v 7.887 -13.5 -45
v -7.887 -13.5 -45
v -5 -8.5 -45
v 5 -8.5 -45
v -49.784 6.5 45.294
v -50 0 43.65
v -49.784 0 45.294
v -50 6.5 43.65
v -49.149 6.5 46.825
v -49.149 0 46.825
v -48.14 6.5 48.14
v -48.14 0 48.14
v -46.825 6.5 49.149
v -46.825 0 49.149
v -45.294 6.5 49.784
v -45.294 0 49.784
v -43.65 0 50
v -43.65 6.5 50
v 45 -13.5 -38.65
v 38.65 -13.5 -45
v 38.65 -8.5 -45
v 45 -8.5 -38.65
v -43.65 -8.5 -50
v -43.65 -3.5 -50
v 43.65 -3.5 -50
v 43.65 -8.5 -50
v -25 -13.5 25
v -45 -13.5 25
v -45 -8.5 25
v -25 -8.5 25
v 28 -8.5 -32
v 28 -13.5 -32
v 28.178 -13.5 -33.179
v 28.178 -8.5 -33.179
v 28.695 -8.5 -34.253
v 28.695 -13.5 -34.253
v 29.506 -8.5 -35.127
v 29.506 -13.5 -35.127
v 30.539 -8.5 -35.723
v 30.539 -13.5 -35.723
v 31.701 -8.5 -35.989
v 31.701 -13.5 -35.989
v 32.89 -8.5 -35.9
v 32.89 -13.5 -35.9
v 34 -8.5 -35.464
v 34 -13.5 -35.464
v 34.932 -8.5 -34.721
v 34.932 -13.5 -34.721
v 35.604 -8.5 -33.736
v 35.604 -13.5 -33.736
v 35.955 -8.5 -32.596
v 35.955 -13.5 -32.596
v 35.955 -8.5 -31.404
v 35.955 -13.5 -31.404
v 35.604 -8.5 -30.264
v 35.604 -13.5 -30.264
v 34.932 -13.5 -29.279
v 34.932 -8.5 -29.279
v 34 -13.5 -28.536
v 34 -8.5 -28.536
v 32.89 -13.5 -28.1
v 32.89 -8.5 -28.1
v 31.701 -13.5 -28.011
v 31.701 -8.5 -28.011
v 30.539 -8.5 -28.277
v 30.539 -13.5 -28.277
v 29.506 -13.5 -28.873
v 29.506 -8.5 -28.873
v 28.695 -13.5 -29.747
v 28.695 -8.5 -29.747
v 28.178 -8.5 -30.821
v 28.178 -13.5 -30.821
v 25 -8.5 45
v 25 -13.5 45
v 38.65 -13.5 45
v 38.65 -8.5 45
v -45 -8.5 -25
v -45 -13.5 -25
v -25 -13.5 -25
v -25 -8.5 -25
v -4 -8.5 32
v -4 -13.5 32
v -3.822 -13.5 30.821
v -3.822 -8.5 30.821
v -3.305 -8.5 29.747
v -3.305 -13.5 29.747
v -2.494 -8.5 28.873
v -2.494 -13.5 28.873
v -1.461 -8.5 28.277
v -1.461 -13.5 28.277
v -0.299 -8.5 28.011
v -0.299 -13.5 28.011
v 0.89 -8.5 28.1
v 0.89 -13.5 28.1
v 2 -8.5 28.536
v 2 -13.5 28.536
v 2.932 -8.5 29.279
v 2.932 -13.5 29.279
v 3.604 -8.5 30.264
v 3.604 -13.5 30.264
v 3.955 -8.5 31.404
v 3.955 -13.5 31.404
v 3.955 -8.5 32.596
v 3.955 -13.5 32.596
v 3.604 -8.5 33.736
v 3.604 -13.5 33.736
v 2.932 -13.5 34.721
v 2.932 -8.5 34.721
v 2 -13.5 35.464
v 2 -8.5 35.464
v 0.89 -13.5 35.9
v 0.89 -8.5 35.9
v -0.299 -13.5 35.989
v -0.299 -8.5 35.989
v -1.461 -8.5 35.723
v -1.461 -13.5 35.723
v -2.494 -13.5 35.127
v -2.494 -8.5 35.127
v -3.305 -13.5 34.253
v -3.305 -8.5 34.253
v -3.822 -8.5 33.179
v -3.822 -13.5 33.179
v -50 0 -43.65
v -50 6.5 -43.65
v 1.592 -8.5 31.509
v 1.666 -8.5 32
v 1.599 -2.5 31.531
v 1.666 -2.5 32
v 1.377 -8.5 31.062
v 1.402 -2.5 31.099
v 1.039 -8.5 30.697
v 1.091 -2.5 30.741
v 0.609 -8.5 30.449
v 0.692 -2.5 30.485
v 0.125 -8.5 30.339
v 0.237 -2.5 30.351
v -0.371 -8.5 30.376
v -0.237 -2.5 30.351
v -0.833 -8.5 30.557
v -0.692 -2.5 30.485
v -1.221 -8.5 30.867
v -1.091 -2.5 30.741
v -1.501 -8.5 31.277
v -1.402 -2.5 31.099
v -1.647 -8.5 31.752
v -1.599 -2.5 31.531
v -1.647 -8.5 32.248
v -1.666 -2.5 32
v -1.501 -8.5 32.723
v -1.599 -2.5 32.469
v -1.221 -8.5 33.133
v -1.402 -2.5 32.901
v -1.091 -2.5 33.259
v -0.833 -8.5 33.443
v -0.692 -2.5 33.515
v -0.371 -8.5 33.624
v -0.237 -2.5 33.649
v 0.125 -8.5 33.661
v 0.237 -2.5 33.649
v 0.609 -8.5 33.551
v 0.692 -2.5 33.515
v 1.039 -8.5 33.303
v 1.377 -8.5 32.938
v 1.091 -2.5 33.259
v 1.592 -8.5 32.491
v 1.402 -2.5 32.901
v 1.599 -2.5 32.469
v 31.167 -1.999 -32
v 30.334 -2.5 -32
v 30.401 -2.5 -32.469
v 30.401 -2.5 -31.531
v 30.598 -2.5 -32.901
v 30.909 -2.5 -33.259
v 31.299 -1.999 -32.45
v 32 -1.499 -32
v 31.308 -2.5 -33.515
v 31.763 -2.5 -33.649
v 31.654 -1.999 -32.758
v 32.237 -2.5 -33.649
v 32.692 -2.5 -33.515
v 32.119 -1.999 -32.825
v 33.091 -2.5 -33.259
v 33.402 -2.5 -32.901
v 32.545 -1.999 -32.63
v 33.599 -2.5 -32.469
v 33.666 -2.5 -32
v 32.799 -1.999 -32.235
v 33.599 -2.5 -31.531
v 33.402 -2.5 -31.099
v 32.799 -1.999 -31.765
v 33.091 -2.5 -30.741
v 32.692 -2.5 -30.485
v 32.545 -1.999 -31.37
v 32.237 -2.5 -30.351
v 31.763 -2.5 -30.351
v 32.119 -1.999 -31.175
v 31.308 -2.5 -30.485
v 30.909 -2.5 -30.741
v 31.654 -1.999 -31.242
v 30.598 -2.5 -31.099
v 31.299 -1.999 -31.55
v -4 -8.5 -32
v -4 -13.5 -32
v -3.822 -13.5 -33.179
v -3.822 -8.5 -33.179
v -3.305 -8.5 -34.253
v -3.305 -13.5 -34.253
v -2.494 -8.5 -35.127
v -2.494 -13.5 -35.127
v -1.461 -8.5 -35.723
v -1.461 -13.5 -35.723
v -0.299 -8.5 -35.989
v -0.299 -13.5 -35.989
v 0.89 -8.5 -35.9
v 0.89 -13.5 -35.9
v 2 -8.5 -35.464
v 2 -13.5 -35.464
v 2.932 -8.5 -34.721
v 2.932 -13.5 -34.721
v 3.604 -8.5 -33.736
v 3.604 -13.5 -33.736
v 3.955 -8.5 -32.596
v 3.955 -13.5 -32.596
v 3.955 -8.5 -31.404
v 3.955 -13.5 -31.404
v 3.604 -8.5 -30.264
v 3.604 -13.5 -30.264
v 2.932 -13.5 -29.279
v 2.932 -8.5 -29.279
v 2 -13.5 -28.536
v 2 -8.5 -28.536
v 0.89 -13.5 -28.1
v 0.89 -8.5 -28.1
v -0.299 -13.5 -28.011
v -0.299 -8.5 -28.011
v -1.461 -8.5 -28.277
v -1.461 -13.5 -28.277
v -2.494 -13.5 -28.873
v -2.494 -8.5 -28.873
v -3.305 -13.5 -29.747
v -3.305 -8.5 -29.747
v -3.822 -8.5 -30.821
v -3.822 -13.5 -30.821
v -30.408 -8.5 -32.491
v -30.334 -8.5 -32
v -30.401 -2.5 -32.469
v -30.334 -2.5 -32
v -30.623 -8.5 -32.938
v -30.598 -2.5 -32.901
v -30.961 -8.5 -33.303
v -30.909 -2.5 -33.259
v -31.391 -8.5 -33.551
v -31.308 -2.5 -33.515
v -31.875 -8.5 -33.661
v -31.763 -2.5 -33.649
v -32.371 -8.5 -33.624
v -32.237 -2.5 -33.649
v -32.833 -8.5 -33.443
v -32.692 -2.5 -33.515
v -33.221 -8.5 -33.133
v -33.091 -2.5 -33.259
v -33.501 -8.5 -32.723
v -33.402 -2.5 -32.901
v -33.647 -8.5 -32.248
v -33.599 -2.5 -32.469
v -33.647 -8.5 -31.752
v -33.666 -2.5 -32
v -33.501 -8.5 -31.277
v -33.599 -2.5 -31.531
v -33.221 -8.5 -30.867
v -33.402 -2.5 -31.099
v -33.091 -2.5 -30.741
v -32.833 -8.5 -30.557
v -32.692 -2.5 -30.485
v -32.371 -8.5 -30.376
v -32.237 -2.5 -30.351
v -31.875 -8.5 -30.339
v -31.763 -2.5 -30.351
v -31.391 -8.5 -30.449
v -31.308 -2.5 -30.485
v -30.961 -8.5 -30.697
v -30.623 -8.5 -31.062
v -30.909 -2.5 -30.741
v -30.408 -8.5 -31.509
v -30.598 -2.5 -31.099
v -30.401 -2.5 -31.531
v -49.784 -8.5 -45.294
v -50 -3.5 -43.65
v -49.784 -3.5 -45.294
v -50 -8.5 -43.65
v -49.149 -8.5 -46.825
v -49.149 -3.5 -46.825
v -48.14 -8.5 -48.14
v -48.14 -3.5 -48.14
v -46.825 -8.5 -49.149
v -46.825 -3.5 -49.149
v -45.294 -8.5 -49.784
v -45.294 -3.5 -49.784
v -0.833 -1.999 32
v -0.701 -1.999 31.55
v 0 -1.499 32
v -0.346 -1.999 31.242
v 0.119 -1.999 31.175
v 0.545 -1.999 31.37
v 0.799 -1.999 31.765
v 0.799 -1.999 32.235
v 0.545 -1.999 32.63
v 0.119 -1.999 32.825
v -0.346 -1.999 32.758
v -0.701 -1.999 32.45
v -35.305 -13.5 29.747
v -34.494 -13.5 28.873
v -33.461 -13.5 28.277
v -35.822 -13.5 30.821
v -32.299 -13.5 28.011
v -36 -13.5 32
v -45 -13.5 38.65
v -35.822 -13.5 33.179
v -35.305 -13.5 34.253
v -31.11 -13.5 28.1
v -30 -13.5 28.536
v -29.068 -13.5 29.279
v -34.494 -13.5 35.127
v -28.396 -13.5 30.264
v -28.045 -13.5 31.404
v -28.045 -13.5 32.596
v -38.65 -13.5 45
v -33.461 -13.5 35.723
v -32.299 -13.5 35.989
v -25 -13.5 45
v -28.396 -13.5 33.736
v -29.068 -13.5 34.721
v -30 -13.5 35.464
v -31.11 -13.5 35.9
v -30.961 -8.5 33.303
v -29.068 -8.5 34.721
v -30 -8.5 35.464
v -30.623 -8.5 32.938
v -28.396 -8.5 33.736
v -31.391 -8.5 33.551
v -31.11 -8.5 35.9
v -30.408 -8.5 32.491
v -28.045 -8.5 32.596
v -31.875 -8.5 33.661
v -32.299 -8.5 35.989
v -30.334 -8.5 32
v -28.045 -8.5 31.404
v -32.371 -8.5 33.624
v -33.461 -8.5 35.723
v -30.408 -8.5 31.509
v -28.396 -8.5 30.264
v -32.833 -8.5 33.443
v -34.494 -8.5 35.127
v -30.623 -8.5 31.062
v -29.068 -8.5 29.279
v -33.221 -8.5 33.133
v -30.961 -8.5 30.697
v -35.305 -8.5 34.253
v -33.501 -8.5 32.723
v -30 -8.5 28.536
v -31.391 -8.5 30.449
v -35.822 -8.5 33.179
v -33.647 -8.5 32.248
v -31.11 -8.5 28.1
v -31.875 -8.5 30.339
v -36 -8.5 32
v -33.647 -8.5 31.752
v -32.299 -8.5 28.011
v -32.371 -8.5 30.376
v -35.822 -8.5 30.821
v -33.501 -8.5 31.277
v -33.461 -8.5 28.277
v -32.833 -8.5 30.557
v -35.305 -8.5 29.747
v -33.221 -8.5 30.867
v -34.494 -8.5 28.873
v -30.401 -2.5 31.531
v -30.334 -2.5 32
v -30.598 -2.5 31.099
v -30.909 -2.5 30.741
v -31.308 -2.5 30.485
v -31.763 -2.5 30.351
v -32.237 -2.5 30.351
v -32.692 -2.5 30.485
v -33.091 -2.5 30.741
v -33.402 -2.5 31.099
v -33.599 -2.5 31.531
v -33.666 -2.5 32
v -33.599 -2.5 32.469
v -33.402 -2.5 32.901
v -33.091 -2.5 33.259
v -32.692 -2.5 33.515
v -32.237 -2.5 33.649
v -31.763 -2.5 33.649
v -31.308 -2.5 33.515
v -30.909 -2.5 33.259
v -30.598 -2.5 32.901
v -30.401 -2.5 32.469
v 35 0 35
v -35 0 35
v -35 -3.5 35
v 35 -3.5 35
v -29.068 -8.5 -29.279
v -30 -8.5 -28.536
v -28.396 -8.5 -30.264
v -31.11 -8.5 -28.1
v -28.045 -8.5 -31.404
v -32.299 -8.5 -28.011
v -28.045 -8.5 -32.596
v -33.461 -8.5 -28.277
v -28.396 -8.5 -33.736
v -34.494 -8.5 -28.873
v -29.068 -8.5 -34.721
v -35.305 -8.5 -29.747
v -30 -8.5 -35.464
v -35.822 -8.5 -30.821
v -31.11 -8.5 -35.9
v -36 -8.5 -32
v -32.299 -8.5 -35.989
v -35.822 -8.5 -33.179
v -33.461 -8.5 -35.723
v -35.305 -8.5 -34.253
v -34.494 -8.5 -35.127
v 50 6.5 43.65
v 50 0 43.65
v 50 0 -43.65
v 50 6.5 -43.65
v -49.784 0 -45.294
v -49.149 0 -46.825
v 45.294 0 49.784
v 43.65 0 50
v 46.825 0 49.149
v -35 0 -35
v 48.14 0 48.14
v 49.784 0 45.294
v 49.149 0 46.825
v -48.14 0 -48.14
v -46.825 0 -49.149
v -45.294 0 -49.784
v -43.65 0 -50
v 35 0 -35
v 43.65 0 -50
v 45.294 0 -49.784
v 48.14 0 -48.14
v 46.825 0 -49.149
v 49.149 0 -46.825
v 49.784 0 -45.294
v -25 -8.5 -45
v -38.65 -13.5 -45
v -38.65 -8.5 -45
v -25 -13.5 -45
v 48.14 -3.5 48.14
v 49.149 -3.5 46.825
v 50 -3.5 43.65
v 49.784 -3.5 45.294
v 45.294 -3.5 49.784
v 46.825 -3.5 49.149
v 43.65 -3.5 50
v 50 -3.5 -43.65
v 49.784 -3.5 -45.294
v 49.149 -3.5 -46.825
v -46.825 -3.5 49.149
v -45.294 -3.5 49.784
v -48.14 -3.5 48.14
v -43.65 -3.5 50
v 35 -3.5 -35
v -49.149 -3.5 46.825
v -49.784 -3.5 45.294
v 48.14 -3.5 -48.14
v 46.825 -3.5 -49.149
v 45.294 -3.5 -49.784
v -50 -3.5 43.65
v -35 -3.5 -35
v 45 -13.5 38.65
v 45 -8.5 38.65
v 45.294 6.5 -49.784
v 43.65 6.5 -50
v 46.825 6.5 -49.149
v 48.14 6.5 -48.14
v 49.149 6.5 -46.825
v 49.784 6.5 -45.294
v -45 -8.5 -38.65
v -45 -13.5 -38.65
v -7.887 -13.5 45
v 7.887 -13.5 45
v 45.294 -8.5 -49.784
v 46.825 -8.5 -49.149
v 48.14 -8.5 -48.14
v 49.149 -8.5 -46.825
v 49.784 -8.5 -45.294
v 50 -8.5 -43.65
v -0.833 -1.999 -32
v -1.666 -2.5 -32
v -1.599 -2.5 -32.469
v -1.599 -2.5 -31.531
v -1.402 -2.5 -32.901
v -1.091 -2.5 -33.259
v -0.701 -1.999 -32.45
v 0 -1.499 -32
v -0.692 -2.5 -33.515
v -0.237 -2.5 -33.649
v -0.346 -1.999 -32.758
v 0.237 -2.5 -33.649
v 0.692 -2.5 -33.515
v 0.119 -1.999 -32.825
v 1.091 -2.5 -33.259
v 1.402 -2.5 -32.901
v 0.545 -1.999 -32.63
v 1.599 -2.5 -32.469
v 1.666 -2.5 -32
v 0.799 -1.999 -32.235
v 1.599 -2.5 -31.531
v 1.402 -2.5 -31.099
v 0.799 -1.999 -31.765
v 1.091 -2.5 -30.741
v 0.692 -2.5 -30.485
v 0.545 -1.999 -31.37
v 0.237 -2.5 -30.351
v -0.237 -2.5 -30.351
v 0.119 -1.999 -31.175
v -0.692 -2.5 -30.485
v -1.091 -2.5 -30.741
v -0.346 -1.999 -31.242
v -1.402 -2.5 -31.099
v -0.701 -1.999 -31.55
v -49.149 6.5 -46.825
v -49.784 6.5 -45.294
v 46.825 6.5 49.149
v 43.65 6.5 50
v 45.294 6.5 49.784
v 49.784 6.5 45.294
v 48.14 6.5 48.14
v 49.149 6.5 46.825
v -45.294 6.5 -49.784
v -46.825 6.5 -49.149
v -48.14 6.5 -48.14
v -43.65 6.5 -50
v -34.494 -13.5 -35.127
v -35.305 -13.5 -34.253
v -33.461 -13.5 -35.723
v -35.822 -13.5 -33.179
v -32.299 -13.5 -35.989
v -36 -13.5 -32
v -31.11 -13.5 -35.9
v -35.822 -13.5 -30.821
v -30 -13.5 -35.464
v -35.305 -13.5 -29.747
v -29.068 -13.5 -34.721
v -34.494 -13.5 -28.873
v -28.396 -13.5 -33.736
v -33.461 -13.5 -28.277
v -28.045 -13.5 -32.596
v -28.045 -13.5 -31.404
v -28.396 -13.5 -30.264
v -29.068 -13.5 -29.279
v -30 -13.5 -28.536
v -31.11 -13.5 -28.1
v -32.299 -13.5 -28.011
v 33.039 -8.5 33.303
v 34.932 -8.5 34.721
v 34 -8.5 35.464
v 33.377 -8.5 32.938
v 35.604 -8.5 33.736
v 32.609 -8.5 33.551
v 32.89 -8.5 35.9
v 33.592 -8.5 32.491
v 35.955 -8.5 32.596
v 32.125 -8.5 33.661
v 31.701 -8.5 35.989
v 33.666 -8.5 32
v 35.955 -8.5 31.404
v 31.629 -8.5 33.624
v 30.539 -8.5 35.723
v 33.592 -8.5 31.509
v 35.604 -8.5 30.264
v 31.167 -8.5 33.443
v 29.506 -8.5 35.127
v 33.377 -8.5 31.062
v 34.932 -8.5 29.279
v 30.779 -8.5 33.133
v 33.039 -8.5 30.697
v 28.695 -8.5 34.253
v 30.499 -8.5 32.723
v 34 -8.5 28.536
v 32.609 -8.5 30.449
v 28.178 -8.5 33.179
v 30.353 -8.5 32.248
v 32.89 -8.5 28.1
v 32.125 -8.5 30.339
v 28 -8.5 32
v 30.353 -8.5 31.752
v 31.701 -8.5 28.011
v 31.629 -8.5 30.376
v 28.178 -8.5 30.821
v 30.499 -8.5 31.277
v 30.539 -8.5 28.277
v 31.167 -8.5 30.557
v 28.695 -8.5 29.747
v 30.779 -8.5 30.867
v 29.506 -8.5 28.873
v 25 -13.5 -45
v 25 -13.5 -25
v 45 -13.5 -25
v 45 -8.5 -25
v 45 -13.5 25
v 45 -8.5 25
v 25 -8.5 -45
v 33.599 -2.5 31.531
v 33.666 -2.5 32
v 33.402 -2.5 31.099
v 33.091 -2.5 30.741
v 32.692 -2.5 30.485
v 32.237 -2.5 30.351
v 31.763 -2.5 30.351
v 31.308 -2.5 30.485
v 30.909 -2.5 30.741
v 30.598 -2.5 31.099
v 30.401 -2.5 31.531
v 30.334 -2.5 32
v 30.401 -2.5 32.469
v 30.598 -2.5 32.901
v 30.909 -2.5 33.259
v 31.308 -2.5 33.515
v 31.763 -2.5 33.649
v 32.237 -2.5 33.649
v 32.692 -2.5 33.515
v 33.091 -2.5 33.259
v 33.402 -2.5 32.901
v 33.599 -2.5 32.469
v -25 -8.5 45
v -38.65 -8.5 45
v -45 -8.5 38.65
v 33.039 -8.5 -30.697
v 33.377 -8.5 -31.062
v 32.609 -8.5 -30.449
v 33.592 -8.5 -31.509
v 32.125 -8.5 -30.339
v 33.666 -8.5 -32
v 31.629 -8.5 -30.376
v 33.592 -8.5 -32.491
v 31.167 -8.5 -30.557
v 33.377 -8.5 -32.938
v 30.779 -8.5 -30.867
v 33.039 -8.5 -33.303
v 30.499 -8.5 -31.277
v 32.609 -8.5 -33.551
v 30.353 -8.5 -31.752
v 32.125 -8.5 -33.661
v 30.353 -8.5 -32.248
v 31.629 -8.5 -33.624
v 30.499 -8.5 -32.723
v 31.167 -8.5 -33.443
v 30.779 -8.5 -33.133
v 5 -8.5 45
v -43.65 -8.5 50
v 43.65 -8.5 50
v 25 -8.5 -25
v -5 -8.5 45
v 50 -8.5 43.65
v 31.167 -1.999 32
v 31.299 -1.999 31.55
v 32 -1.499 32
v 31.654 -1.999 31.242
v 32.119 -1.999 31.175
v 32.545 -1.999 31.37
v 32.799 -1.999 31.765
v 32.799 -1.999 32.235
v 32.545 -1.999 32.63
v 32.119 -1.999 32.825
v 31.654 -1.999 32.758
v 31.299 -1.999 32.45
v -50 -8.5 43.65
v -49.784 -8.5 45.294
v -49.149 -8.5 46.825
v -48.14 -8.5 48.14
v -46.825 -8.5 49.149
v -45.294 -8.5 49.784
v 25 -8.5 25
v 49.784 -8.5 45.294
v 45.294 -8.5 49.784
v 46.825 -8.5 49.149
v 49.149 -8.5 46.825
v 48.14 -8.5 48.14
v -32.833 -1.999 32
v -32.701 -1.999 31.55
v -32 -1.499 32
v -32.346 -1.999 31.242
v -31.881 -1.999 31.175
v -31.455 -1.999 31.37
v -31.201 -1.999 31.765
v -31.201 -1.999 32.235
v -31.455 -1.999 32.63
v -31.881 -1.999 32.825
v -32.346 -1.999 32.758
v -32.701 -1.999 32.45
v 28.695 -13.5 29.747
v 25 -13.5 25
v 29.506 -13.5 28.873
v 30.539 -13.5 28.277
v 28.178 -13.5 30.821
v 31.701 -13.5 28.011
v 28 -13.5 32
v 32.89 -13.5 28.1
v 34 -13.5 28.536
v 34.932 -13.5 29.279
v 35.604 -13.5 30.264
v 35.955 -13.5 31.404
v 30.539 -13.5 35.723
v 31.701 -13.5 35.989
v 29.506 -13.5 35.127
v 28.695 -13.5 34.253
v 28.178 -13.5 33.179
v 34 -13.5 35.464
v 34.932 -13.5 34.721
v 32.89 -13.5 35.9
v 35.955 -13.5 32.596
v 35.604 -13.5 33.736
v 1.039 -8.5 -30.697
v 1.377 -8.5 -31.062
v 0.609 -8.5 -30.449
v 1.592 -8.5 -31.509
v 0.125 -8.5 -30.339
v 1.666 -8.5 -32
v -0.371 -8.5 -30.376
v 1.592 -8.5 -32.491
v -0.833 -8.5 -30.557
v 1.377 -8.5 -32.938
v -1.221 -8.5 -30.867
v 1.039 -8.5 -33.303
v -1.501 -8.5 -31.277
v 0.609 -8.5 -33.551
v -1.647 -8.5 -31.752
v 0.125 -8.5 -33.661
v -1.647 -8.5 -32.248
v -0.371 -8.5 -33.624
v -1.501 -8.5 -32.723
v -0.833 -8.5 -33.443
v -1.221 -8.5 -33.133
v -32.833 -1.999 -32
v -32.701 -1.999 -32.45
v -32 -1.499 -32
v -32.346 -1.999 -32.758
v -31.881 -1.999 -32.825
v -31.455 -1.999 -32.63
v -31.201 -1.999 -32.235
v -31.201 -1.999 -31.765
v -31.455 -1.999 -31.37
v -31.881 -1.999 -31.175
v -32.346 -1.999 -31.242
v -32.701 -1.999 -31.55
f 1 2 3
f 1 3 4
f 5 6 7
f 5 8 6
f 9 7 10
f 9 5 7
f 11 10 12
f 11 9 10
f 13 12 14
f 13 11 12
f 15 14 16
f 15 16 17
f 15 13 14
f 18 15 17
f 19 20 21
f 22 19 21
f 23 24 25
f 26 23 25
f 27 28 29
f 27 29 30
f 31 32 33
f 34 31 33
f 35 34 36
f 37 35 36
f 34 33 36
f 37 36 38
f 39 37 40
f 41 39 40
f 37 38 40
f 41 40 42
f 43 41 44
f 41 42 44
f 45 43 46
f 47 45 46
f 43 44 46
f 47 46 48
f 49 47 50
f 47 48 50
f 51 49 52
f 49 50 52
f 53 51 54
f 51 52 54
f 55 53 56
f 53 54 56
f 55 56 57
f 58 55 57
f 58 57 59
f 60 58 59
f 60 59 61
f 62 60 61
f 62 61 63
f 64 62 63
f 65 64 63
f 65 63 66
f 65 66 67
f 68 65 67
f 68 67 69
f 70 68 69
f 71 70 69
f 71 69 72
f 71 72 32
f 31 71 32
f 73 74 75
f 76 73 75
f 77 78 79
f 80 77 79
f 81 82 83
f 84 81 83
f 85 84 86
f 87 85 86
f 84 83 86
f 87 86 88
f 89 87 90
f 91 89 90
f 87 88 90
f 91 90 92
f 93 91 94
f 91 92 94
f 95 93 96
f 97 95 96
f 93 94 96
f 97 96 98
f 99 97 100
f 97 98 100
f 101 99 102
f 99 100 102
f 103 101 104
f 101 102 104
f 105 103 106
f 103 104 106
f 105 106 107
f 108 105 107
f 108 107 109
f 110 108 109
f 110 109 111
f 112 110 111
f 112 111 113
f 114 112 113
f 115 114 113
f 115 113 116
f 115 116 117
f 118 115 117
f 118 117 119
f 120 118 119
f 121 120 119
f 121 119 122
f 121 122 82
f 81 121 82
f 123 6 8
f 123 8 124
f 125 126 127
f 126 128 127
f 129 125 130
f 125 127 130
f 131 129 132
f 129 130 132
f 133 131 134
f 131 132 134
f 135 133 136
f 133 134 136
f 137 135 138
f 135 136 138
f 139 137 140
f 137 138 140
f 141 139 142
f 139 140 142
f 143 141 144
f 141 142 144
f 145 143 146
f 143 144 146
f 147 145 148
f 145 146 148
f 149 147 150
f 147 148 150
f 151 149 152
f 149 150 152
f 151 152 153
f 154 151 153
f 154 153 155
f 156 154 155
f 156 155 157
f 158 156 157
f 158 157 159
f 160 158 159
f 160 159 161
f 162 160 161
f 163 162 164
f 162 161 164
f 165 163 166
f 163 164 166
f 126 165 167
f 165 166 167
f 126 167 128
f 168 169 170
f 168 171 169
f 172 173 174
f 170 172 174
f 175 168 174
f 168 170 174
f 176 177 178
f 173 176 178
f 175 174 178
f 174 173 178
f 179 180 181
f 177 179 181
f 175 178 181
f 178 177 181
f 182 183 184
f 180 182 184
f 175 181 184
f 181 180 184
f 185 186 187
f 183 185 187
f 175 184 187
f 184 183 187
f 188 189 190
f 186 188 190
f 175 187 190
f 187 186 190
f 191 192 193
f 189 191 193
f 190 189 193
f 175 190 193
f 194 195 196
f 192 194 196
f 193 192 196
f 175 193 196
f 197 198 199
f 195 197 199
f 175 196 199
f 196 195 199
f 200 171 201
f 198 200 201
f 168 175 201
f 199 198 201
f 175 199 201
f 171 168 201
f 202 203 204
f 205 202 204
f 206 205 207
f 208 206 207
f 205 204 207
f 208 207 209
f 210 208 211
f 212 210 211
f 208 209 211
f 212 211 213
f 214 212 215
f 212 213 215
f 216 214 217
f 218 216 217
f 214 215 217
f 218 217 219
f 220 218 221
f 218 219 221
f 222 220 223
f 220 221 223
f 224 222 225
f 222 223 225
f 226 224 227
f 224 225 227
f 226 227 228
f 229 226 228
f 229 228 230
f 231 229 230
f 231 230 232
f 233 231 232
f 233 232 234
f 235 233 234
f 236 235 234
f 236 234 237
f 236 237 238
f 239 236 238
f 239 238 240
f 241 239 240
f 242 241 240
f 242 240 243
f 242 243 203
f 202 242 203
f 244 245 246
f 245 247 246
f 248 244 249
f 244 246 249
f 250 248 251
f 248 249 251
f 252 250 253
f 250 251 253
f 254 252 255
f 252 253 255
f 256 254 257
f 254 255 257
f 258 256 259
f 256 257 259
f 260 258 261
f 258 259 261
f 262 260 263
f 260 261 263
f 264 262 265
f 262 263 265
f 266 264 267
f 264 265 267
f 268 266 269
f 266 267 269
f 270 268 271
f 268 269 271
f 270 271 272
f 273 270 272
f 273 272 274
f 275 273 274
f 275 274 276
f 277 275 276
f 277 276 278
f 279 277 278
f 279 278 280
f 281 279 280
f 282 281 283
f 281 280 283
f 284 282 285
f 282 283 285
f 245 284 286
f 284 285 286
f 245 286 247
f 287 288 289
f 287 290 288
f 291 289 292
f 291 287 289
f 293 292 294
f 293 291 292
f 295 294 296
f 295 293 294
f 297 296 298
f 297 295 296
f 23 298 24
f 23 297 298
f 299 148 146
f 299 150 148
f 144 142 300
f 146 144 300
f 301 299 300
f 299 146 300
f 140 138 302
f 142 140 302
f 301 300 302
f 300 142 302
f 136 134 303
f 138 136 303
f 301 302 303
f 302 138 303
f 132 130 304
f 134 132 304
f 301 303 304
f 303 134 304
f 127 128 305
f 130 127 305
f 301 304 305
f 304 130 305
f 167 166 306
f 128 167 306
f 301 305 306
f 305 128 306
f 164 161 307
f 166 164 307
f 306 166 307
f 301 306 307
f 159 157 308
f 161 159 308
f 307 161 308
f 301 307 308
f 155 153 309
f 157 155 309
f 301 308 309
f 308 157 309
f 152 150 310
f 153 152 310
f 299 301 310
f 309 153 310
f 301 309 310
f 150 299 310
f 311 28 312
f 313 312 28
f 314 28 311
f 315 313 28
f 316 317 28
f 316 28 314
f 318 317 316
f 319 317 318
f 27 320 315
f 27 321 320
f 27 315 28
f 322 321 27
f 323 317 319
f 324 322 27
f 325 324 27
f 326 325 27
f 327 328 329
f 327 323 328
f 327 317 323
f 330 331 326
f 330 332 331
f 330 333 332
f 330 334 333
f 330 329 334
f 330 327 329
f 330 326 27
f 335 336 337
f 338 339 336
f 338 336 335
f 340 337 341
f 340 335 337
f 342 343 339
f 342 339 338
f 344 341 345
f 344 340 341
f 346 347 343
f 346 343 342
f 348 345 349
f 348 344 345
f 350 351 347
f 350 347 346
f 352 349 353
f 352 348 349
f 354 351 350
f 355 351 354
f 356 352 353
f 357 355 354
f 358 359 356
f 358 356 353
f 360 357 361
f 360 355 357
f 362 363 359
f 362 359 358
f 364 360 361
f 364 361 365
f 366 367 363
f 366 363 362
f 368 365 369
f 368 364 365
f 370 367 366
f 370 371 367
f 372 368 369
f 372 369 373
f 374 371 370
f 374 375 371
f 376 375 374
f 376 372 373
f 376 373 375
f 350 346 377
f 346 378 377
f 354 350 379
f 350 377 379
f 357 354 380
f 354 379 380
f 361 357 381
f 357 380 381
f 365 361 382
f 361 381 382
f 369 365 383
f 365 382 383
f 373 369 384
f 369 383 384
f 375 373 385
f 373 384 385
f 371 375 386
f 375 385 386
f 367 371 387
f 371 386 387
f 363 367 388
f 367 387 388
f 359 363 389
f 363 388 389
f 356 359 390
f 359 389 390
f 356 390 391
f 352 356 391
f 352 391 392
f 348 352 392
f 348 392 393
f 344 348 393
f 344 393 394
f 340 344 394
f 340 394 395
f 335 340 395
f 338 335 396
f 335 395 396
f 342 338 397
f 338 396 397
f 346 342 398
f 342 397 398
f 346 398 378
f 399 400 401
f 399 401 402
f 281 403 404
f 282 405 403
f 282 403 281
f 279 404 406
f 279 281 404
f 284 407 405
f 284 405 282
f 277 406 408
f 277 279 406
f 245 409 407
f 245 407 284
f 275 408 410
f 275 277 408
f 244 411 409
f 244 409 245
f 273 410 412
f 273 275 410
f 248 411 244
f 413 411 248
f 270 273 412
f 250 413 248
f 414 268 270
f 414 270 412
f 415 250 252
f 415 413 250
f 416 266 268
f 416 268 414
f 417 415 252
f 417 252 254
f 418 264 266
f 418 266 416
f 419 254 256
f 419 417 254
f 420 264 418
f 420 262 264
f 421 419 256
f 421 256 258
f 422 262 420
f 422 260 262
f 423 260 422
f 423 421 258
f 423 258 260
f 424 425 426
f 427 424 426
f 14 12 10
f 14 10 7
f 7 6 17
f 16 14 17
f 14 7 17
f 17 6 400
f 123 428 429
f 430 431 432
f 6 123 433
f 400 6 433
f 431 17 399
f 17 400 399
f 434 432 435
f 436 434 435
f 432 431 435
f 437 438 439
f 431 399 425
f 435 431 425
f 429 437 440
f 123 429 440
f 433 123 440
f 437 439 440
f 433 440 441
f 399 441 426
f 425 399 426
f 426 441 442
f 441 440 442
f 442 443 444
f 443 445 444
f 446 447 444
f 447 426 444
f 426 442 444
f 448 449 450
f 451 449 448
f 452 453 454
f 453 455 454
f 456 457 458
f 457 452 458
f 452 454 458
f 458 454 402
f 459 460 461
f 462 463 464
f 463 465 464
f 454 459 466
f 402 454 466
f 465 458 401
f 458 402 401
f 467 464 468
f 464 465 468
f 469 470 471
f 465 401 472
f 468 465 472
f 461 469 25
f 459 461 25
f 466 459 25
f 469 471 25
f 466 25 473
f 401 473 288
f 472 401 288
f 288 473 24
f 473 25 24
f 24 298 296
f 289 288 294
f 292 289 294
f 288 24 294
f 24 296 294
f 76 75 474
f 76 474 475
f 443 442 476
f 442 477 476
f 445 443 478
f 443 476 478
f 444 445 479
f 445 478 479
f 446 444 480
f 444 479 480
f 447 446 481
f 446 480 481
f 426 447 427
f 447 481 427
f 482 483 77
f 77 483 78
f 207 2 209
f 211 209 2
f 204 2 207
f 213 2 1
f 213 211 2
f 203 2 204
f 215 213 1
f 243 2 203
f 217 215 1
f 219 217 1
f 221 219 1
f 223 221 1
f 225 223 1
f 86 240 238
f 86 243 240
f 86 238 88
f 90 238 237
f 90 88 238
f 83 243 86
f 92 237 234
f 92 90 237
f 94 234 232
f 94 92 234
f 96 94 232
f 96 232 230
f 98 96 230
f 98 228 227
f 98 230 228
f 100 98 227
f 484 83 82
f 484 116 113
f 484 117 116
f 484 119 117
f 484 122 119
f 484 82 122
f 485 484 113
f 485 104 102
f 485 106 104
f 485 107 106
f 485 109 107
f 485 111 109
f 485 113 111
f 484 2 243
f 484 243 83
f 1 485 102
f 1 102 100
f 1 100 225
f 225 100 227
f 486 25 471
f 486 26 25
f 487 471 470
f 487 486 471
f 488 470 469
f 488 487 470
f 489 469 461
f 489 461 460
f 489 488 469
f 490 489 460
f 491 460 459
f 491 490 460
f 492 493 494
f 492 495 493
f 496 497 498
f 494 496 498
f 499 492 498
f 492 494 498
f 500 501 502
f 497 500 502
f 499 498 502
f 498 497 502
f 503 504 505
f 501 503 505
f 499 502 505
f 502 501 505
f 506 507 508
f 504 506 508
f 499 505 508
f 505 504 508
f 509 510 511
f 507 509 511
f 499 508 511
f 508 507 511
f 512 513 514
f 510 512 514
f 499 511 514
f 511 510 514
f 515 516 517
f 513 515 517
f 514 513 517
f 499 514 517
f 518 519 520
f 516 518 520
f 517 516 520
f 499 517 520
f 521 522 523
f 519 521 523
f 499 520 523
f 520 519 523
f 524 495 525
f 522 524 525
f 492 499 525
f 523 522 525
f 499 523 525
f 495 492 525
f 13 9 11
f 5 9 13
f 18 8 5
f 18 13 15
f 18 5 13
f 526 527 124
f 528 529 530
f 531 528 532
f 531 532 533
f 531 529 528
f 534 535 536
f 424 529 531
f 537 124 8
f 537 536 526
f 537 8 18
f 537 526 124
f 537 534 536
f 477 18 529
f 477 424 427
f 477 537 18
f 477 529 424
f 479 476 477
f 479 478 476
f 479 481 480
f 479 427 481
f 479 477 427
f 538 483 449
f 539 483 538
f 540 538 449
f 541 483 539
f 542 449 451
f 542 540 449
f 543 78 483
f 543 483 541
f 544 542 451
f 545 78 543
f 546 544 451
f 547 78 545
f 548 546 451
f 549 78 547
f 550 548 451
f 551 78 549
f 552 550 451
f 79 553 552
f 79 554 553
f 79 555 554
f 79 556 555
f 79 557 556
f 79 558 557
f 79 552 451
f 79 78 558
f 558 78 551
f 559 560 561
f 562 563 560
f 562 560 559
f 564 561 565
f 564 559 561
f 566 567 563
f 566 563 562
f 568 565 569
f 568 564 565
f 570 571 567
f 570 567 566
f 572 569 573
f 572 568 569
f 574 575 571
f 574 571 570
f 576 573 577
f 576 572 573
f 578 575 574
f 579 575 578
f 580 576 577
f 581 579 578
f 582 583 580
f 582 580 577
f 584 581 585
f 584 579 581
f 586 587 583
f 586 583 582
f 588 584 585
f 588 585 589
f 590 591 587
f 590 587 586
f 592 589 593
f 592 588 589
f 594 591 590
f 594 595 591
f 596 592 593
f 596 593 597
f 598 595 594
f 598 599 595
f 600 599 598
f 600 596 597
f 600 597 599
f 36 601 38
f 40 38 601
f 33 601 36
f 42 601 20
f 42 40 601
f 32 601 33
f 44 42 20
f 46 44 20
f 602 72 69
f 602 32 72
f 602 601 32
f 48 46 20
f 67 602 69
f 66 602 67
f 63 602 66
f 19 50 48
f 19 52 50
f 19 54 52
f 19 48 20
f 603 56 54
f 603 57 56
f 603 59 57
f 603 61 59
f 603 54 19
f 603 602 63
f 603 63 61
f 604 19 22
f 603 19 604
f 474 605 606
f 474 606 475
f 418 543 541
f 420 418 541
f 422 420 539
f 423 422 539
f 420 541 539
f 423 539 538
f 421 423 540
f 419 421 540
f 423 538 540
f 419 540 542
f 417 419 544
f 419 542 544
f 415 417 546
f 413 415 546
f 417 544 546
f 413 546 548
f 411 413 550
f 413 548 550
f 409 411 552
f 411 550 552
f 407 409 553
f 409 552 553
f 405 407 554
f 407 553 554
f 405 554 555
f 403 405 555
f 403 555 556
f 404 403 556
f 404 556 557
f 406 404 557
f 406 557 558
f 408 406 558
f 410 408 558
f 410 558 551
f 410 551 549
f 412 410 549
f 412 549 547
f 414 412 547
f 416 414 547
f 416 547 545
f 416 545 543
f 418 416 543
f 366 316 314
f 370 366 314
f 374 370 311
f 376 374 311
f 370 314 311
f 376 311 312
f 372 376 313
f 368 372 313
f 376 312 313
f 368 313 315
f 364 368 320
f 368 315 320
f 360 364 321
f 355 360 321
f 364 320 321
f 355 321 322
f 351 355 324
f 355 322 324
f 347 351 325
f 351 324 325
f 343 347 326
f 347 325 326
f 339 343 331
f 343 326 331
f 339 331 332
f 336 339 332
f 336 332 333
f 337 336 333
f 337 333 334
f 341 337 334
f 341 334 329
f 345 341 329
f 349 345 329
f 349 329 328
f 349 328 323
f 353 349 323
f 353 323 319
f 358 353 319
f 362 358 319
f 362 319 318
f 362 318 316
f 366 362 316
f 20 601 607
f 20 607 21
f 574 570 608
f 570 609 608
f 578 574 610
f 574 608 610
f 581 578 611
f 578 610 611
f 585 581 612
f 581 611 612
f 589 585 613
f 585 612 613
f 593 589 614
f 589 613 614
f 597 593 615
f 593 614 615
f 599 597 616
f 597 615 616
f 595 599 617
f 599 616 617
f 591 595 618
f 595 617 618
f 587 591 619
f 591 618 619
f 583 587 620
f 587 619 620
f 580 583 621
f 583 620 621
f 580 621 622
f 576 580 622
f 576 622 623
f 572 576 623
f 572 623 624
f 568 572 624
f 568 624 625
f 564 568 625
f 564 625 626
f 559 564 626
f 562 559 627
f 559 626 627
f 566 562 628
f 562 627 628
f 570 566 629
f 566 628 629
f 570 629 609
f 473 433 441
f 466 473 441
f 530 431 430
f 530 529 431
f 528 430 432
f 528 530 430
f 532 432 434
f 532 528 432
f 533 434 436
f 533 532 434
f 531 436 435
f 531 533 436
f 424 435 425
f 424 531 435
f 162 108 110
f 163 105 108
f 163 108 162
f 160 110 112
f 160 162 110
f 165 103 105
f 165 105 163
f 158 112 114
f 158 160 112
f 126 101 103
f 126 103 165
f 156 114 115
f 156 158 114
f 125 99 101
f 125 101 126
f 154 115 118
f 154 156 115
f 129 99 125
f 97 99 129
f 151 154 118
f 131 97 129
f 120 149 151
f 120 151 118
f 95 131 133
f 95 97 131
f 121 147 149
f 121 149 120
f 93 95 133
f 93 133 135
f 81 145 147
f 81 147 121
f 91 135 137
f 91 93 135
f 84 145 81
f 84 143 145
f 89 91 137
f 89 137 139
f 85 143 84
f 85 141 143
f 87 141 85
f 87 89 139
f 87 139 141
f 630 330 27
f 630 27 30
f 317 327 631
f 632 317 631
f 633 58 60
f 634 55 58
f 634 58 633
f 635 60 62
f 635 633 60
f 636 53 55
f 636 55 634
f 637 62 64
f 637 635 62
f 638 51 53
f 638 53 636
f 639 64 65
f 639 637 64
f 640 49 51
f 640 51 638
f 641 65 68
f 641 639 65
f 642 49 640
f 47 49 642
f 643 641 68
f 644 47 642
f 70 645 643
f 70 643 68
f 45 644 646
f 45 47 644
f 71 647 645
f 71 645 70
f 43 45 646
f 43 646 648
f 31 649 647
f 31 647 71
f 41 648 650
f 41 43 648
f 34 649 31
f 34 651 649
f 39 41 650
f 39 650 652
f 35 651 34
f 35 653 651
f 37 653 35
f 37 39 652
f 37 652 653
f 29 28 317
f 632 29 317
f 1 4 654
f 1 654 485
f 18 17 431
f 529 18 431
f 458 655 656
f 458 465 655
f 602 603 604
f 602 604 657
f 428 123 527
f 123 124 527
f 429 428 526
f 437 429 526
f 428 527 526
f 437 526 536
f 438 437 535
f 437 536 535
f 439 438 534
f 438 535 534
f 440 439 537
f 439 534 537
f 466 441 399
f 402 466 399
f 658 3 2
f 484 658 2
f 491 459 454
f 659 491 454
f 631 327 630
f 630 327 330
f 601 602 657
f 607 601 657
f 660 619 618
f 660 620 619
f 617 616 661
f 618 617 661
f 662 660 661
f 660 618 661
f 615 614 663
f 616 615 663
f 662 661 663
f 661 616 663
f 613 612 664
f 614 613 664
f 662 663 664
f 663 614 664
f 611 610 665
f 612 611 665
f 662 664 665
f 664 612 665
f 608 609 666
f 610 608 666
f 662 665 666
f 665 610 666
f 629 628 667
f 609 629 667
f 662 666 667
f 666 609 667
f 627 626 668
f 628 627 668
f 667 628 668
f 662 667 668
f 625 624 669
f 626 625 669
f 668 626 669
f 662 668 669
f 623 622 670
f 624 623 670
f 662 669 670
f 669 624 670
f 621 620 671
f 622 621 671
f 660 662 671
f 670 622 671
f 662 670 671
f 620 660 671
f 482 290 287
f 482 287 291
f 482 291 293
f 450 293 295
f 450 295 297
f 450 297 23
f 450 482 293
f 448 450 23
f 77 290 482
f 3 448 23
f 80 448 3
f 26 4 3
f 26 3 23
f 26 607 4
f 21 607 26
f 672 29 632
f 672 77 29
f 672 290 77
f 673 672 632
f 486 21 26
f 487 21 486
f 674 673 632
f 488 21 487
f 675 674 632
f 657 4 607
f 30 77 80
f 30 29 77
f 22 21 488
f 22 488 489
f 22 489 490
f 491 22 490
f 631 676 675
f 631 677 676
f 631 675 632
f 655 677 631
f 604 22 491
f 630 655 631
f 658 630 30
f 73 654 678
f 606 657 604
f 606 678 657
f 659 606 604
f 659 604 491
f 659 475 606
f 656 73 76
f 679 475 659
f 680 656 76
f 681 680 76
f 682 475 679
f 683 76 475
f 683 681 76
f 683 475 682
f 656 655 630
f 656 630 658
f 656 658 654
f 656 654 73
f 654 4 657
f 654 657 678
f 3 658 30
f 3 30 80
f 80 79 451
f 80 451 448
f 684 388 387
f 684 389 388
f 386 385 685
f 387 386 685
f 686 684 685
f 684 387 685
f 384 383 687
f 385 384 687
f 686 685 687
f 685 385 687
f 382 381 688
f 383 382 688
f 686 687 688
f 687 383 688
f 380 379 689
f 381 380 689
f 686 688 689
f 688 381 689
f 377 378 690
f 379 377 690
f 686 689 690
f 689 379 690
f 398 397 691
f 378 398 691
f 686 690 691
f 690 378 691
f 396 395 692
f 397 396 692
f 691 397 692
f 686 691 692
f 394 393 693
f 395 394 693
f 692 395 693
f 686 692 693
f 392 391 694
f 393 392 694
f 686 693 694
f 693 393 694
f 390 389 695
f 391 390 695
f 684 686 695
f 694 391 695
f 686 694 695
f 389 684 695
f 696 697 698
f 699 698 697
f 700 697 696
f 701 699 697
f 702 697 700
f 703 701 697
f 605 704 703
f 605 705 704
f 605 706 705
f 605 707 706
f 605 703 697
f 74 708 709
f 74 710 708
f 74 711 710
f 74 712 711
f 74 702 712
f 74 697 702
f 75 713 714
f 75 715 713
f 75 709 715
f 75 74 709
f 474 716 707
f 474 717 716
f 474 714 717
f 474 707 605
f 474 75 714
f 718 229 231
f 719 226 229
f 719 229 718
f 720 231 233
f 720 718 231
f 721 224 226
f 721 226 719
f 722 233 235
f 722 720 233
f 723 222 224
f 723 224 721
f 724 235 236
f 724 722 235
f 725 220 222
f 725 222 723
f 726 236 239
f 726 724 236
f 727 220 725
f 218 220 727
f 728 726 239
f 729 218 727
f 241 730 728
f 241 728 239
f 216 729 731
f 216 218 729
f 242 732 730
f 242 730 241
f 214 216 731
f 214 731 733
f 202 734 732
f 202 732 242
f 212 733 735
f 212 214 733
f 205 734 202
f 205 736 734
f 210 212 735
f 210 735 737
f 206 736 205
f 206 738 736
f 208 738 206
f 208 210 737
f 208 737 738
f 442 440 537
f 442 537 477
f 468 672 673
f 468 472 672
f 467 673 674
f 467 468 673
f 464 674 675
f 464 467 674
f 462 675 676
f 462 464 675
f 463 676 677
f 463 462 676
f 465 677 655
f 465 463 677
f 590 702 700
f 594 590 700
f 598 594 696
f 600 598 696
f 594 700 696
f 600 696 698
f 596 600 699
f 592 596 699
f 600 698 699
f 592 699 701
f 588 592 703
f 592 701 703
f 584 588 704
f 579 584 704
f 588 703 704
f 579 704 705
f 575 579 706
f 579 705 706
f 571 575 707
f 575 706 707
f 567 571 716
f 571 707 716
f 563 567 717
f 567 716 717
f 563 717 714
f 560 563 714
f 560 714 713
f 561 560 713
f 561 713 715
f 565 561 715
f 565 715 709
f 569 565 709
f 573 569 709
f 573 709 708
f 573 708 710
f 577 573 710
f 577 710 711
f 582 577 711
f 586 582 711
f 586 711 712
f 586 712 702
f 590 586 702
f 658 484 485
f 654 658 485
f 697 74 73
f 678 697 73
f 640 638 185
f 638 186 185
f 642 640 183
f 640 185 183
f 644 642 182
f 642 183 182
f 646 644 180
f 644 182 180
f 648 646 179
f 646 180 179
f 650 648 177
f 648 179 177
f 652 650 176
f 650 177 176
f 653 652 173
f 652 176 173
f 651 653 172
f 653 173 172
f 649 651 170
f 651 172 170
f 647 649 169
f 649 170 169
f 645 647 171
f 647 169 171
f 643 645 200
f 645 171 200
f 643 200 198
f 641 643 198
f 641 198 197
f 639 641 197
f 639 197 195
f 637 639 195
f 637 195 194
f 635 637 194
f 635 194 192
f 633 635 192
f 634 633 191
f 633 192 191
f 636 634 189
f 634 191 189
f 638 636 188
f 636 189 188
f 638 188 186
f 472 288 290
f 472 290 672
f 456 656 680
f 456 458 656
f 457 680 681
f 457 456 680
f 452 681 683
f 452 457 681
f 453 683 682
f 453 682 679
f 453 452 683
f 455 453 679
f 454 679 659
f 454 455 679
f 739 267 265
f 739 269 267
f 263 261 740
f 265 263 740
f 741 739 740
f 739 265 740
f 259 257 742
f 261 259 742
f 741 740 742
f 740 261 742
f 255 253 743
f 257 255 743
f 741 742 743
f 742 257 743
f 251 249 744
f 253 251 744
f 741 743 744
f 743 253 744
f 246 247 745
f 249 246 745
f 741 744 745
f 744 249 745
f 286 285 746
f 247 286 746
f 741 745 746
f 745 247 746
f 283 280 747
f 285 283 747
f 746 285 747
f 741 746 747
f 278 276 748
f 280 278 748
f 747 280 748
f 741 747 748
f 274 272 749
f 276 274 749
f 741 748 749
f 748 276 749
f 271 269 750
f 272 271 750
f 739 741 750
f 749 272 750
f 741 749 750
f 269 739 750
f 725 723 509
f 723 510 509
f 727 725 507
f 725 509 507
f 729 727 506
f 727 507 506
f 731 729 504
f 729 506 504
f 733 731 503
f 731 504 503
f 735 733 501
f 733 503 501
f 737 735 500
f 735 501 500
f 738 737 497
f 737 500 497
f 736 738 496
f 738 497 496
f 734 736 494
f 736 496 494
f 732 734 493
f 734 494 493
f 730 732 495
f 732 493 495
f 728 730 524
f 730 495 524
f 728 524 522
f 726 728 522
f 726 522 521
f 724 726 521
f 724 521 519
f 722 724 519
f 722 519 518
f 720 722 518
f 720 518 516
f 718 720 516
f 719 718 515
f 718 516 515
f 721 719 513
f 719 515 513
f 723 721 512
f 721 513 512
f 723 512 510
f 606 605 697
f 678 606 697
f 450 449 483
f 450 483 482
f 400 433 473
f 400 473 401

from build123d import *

# Parameters (mm, degrees)
SKETCH1_W                                   = 100
SKETCH1_H                                   = 100
BOSS_EXTRUDE1_DEPTH                         = 6.5
SKETCH2_W                                   = 100
SKETCH2_H                                   = 100
BOSS_EXTRUDE2_DEPTH                         = 5
SKETCH3_W                                   = 100
SKETCH3_H                                   = 100
BOSS_EXTRUDE3_DEPTH                         = 5
CUT_EXTRUDE1_DEPTH                          = 101
SKETCH6_W                                   = 100
SKETCH6_H                                   = 100
SKETCH6_W_2                                 = 90
SKETCH6_H_2                                 = 90
CUT_EXTRUDE2_DEPTH                          = 5
SKETCH9_W                                   = 70
SKETCH9_H                                   = 70
BOSS_EXTRUDE4_DEPTH                         = 3.5
CBORE_FOR_M5_CHEESE_HEAD_SCREW1_D           = 3.332
CBORE_FOR_M5_CHEESE_HEAD_SCREW1_DEPTH       = 11
CBORE_FOR_M5_CHEESE_HEAD_SCREW1_CBORE_D     = 8
CBORE_FOR_M5_CHEESE_HEAD_SCREW1_CBORE_DEPTH = 5
CBORE_FOR_M5_CHEESE_HEAD_SCREW1_TIP         = 1.001033791
FILLET1_R                                   = 6.35
CHAMFER1_SIZE                               = 6.35
SKETCH14_W                                  = 25
SKETCH14_H                                  = 50
CUT_EXTRUDE3_DEPTH                          = 5


with BuildPart() as part:
    # Sketch1 → Boss-Extrude1 (new body)
    with BuildSketch(Plane(origin=(0, 0, 0), x_dir=(1, 0, 0), z_dir=(0, 1, 0))):
        Rectangle(SKETCH1_W, SKETCH1_H)
    extrude(amount=BOSS_EXTRUDE1_DEPTH)



with BuildPart() as body_2:
    # Sketch2 → Boss-Extrude2 (new body)
    with BuildSketch(Plane(origin=(0, -3.5, 0), x_dir=(-1, 0, 0), z_dir=(0, -1, 0))):
        Rectangle(SKETCH2_W, SKETCH2_H)
    extrude(amount=BOSS_EXTRUDE2_DEPTH)

    # Sketch3 → Boss-Extrude3 (add)
    with BuildSketch(Plane.XZ.offset(8.5)):
        Rectangle(SKETCH3_W, SKETCH3_H)
    extrude(amount=BOSS_EXTRUDE3_DEPTH)

    # Sketch4 → Cut-Extrude1 (cut, through all)
    with BuildSketch(Plane.XY.offset(50)):
        Polygon((-25, -13.5), (-25, -8.5), (-5, -8.5), (-7.886751346, -13.5), align=None)
    cut_extrude1 = extrude(amount=-CUT_EXTRUDE1_DEPTH, mode=Mode.SUBTRACT)

    # Mirror1: Cut-Extrude1 across plane
    add(cut_extrude1.mirror(Plane(origin=(0, 0, 0), x_dir=(0, 0, 1), z_dir=(1, 0, 0))), mode=Mode.SUBTRACT)

    # Sketch6 → Cut-Extrude2 (cut)
    with BuildSketch(Plane.XZ.offset(13.5)):
        Rectangle(SKETCH6_W, SKETCH6_H)
        Rectangle(SKETCH6_W_2, SKETCH6_H_2, mode=Mode.SUBTRACT)
    extrude(amount=-CUT_EXTRUDE2_DEPTH, mode=Mode.SUBTRACT)


with BuildPart() as part_1:
    add(part.part)

    add(body_2.part)  # Boss-Extrude4 merges body 2
    # Sketch9 → Boss-Extrude4 (add)
    with BuildSketch(Plane.XZ):
        Rectangle(SKETCH9_W, SKETCH9_H)
    extrude(amount=BOSS_EXTRUDE4_DEPTH)

    # CBORE for M5 Cheese Head Screw1
    with Locations(Plane(origin=(0, -13.5, 0), x_dir=(-1, 0, 0), z_dir=(0, -1, 0))):
        with Locations((-32, 32), (0, 32), (32, 32), (32, -32), (0, -32), (-32, -32)):
            CounterBoreHole(CBORE_FOR_M5_CHEESE_HEAD_SCREW1_D / 2, CBORE_FOR_M5_CHEESE_HEAD_SCREW1_CBORE_D / 2, CBORE_FOR_M5_CHEESE_HEAD_SCREW1_CBORE_DEPTH, depth=CBORE_FOR_M5_CHEESE_HEAD_SCREW1_DEPTH)
            with Locations((0, 0, -(CBORE_FOR_M5_CHEESE_HEAD_SCREW1_DEPTH + CBORE_FOR_M5_CHEESE_HEAD_SCREW1_TIP / 2))):  # 118° drill point
                Cone(0, CBORE_FOR_M5_CHEESE_HEAD_SCREW1_D / 2, CBORE_FOR_M5_CHEESE_HEAD_SCREW1_TIP, mode=Mode.SUBTRACT)

    # Fillet1
    fillet1_edges = [part_1.edges().sort_by_distance(p)[0] for p in [
        (50, -6, 50),
        (-50, -6, -50),
        (-50, -6, 50),
        (50, -6, -50),
        (-50, 3.25, -50),
        (50, 3.25, -50),
        (50, 3.25, 50),
        (-50, 3.25, 50),
    ]]
    fillet(fillet1_edges, radius=FILLET1_R)

    # Chamfer1
    chamfer1_edges = [part_1.edges().sort_by_distance(p)[0] for p in [
        (45, -11, -45),
        (45, -11, 45),
        (-45, -11, 45),
        (-45, -11, -45),
    ]]
    chamfer(chamfer1_edges, length=CHAMFER1_SIZE)

    # Sketch14 → Cut-Extrude3 (cut)
    with BuildSketch(Plane.XZ.offset(13.5)):
        with Locations((-37.5, 0)):
            Rectangle(SKETCH14_W, SKETCH14_H)
    cut_extrude3 = extrude(amount=-CUT_EXTRUDE3_DEPTH, mode=Mode.SUBTRACT)

    # Mirror2: Cut-Extrude3 across plane
    add(cut_extrude3.mirror(Plane(origin=(0, 0, 0), x_dir=(0, 0, 1), z_dir=(1, 0, 0))), mode=Mode.SUBTRACT)


solid = part_1.part
